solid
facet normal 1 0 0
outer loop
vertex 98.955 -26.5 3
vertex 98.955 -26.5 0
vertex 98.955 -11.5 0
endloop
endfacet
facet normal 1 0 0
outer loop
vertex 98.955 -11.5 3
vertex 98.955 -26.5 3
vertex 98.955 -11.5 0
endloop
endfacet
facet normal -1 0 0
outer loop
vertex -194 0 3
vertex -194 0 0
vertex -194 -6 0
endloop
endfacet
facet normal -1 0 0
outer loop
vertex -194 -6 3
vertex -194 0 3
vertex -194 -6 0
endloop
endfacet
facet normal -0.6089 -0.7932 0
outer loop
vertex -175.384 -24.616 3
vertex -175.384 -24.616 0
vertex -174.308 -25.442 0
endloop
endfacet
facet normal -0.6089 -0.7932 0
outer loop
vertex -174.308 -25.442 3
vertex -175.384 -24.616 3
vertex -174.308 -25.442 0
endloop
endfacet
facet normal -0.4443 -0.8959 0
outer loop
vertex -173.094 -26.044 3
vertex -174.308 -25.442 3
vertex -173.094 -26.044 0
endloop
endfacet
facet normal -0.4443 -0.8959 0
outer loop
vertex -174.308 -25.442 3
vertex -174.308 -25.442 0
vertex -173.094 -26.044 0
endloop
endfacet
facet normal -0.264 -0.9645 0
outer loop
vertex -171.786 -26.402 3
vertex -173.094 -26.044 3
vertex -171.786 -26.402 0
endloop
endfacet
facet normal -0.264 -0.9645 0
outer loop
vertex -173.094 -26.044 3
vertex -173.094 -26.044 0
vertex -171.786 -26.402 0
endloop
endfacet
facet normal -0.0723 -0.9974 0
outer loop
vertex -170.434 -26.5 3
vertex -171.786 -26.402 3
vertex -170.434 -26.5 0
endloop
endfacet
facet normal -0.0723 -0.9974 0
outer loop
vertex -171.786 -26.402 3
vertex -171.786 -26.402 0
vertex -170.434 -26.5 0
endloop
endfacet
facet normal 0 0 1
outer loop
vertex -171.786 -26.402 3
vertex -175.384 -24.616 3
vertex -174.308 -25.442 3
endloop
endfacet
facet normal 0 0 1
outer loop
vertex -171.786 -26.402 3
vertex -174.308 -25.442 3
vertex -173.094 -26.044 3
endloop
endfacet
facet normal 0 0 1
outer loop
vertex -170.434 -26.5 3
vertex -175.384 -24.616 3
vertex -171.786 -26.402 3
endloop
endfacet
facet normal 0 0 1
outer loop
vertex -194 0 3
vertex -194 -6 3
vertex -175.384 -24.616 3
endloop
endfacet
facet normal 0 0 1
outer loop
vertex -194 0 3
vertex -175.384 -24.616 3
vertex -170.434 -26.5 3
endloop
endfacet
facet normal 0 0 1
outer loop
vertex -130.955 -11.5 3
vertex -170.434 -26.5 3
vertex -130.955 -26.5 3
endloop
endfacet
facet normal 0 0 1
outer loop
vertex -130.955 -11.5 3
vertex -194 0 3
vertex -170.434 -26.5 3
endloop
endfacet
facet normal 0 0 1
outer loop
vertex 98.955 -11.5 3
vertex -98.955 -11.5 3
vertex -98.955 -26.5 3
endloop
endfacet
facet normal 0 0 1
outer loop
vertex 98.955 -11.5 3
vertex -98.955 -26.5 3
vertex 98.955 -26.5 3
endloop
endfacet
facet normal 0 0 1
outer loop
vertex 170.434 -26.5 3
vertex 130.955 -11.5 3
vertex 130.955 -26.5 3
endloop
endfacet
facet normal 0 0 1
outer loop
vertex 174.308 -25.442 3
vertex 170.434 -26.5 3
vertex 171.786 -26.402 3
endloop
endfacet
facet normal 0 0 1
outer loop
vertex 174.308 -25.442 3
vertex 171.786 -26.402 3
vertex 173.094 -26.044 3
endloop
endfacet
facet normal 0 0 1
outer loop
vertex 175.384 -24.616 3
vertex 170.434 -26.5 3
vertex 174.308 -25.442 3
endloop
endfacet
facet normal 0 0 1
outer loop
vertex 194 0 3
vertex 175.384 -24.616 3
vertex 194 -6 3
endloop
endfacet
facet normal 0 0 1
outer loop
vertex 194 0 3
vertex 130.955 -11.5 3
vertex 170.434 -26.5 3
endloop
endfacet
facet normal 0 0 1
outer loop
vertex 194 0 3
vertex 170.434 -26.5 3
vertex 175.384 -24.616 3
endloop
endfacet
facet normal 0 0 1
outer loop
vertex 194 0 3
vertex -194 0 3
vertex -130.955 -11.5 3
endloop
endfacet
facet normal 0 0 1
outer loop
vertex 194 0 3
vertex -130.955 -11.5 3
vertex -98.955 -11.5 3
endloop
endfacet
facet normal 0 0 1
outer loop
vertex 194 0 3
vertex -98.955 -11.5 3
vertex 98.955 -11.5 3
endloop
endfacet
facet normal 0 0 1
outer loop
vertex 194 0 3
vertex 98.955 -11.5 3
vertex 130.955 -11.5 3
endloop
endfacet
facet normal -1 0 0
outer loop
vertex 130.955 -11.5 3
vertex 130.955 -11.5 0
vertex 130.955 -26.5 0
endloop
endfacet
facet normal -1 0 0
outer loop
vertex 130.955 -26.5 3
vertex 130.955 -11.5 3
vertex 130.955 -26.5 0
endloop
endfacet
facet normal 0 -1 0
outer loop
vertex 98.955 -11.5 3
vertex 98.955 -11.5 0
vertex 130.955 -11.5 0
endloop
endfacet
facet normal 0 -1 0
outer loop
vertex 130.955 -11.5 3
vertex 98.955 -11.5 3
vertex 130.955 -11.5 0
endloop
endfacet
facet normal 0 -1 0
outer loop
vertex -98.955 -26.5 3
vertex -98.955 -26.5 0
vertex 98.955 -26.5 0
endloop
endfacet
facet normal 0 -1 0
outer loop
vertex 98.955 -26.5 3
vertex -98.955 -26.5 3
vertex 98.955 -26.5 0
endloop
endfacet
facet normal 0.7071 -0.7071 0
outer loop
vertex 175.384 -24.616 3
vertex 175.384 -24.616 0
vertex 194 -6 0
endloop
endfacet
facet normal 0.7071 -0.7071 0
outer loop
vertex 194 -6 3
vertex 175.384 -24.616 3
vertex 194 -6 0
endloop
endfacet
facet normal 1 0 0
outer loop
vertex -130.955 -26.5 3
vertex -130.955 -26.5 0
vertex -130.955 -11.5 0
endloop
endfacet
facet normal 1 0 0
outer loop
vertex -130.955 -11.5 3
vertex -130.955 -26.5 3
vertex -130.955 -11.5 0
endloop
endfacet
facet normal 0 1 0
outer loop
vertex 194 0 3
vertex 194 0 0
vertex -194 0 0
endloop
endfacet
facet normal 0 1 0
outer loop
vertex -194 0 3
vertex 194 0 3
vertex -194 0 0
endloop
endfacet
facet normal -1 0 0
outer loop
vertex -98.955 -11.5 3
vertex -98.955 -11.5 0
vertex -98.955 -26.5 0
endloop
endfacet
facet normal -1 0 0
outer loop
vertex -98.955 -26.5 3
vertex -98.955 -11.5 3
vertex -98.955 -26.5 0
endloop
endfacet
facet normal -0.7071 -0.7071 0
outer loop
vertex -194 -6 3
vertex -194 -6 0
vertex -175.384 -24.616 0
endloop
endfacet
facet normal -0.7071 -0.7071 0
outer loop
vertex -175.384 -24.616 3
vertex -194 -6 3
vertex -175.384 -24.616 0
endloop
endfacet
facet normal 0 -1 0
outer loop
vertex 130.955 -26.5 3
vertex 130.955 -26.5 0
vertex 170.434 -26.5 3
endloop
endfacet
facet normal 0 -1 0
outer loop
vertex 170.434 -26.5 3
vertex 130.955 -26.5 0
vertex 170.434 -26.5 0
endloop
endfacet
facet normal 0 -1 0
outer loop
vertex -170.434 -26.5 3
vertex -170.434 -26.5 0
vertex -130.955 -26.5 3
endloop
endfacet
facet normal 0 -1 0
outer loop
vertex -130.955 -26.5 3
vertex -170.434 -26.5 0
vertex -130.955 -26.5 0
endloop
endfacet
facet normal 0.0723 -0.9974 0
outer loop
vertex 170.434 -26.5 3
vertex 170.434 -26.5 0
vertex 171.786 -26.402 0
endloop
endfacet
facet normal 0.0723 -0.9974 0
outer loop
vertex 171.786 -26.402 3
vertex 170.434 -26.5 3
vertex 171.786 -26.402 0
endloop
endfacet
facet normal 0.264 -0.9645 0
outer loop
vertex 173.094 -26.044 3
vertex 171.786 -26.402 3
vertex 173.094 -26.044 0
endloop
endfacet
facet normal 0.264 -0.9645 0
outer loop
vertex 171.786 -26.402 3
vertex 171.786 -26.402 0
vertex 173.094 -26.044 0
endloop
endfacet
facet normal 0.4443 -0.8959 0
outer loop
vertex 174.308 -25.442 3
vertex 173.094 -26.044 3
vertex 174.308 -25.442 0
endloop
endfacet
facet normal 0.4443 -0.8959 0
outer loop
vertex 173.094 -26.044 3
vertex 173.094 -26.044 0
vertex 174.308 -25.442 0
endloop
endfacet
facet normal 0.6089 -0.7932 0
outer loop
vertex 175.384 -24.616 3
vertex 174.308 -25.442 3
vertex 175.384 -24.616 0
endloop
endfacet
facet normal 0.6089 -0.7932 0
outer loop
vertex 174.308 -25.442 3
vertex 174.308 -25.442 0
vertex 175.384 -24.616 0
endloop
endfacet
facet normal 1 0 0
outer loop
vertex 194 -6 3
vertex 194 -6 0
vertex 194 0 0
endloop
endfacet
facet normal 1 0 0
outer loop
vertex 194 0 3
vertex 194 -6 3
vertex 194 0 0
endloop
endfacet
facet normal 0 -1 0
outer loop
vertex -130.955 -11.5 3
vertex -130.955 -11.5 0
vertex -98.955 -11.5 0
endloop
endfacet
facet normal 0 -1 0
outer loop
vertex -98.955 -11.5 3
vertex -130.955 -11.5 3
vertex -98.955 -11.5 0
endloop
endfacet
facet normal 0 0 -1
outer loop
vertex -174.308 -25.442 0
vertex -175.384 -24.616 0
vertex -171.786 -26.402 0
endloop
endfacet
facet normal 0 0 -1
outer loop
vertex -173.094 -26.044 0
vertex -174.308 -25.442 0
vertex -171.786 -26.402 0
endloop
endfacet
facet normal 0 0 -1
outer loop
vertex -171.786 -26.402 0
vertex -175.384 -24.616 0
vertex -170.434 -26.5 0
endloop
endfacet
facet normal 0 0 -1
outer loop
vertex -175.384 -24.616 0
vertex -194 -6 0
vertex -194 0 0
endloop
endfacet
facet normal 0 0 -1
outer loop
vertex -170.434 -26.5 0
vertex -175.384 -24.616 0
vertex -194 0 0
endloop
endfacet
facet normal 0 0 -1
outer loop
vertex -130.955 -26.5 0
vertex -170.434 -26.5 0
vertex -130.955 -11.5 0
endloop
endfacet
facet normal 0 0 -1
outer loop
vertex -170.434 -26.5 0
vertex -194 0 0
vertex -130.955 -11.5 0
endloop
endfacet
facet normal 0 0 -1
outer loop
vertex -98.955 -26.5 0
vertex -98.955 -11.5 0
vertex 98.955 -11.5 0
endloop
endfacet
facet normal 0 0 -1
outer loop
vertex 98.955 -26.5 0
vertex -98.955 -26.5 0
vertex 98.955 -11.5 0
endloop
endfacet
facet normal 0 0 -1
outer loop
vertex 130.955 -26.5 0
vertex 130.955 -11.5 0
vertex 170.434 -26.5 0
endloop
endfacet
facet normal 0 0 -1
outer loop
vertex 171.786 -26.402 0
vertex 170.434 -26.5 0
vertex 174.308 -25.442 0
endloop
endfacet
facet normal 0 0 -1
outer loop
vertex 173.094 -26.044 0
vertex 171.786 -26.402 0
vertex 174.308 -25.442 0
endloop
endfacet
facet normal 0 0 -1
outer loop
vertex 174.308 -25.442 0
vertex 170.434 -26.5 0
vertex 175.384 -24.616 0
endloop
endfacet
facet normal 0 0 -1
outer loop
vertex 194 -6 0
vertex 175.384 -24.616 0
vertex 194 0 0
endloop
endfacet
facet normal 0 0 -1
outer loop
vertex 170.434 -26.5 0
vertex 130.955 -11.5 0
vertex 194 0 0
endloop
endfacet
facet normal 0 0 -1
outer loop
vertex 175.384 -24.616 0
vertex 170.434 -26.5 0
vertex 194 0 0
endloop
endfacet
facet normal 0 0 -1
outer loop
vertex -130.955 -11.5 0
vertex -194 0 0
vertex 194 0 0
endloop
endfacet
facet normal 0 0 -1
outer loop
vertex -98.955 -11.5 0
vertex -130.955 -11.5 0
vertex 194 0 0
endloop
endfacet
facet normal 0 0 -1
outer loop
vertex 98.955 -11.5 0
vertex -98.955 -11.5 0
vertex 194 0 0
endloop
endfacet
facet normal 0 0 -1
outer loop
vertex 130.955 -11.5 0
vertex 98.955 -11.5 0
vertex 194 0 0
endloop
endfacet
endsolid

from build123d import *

# Parameters (mm, degrees)
BOSS_EXTRUDE1_DEPTH = 3


with BuildPart() as part:
    # Sketch1 → Boss-Extrude1 (new body)
    with BuildSketch(Plane.XY):
        with BuildLine():
            Line((130.955345629, -26.5), (170.433838397, -26.5))
            ThreePointArc((170.433838397, -26.5), (173.093720589, -26.044378238), (175.383585865, -24.616414135))
            Line((175.383585865, -24.616414135), (194, -6))
            Line((194, -6), (194, 0))
            Line((194, 0), (-194, 0))
            Line((-194, 0), (-194, -6))
            Line((-194, -6), (-175.383585865, -24.616414135))
            ThreePointArc((-175.383585865, -24.616414135), (-173.093720589, -26.044378238), (-170.433838397, -26.5))
            Line((-170.433838397, -26.5), (-130.955345629, -26.5))
            Line((-130.955345629, -26.5), (-130.955345629, -11.5))
            Line((-130.955345629, -11.5), (-98.955345629, -11.5))
            Line((-98.955345629, -11.5), (-98.955345629, -26.5))
            Line((-98.955345629, -26.5), (98.955345629, -26.5))
            Line((98.955345629, -26.5), (98.955345629, -11.5))
            Line((98.955345629, -11.5), (130.955345629, -11.5))
            Line((130.955345629, -11.5), (130.955345629, -26.5))
        make_face()
    extrude(amount=BOSS_EXTRUDE1_DEPTH)


solid = part.part
